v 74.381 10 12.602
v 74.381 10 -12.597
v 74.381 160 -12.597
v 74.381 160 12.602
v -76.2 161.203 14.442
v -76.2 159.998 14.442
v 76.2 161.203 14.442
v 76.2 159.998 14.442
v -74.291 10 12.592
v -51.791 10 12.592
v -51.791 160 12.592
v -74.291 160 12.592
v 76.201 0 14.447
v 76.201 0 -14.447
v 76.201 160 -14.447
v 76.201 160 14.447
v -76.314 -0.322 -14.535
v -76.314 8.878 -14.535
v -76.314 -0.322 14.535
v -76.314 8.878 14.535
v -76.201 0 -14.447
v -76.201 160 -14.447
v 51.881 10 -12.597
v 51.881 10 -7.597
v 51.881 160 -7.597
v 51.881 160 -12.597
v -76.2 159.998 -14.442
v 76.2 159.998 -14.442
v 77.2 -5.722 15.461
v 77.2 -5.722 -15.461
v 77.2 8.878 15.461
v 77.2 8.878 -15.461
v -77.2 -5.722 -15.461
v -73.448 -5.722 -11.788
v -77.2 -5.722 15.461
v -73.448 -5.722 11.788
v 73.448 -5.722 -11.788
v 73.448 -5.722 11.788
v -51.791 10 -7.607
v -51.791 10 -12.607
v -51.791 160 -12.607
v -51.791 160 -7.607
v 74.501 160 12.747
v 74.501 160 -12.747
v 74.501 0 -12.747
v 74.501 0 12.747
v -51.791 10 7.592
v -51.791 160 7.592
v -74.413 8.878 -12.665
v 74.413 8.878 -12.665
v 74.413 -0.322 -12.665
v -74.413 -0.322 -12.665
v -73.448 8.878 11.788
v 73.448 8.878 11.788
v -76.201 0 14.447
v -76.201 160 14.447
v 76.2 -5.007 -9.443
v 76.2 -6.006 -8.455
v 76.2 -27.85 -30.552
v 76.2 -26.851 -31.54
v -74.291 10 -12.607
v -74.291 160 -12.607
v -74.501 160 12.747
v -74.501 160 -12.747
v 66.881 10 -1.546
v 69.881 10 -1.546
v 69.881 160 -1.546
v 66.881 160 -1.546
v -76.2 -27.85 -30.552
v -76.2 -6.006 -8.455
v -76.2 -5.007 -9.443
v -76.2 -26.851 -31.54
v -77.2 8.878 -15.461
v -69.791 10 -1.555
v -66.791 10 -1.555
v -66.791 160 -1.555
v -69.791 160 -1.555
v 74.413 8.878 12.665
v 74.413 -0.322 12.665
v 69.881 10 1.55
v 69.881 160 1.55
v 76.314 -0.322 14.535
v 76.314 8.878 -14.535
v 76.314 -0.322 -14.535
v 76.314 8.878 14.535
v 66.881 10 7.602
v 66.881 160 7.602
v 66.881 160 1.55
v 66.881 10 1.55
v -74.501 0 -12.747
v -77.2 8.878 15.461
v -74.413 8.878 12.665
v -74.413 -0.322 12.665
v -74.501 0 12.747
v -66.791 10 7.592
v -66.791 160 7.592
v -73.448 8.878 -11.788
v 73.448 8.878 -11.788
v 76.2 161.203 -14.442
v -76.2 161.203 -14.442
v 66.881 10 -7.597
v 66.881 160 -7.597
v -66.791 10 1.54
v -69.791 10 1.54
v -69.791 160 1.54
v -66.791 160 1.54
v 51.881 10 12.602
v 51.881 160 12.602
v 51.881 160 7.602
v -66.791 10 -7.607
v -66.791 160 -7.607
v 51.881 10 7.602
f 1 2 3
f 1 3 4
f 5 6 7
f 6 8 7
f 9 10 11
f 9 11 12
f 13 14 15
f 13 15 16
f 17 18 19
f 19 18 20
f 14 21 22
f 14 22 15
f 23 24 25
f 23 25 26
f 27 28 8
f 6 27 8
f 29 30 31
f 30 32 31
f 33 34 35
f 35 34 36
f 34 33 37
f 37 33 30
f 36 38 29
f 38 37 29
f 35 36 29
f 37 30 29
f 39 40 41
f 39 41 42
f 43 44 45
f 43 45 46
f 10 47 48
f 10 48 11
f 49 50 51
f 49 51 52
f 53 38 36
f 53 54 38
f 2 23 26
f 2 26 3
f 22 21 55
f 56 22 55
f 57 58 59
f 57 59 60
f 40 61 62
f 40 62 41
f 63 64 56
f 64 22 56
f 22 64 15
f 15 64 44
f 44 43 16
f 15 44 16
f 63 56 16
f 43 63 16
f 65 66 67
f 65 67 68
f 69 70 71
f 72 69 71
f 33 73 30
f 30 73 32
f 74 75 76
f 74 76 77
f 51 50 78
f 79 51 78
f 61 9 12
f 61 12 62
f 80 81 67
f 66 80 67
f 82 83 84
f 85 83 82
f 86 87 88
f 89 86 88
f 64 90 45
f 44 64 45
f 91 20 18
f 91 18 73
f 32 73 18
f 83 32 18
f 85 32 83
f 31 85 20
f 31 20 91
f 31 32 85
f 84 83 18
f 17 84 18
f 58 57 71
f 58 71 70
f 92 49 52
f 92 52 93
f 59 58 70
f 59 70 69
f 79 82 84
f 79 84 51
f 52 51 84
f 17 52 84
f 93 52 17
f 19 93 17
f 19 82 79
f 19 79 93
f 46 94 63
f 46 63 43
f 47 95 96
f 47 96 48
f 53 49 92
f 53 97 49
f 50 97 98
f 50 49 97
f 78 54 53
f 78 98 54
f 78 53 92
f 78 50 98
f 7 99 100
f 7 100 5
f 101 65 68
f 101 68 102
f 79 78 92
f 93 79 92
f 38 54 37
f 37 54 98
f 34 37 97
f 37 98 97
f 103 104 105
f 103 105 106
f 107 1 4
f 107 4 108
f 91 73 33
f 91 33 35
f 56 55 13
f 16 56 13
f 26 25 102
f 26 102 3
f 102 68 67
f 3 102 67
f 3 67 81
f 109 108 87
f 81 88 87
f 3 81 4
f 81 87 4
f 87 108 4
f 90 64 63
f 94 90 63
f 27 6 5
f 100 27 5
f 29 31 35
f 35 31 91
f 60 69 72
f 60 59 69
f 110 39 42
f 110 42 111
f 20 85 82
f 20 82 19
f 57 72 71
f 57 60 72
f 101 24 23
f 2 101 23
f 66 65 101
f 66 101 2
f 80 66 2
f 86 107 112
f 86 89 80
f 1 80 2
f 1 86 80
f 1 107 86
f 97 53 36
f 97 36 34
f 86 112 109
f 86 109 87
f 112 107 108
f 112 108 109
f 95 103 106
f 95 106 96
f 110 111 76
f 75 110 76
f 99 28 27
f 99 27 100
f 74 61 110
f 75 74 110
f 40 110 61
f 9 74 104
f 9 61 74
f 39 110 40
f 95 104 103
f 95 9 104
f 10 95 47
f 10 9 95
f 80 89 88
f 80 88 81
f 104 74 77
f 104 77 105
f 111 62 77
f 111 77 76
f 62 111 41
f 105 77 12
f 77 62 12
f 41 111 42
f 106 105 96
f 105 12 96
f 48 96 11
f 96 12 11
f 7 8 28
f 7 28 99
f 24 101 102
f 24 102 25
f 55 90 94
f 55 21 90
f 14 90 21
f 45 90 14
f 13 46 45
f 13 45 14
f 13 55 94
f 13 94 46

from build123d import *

# Parameters (mm, degrees)
F0_W      = 152.4018198252
F0_H      = 28.8946051151
F0_W_2    = 149.0018218756
F0_H_2    = 25.4946071655
F1_DEPTH  = 160
F3_START  = -10
F3_DEPTH  = 150
F5_START  = -10
F5_DEPTH  = 150
F6_W      = 1.2055812009
F6_H      = 28.8845263422
F7_DEPTH  = 76.2
F9_DEPTH  = 76.2
F10_W     = 10
F10_H     = 30.9223439544
F11_DEPTH = 77.2
F12_W     = 146.8962877989
F12_H     = 23.5759057105
F13_DEPTH = 112.4
F14_W     = 152.6277539183
F14_H     = 29.0700802796
F14_W_2   = 148.8256156445
F14_H_2   = 25.3299812903
F15_DEPTH = 9.2
F16_DEPTH = 4.6


with BuildPart() as f1:
    # F0 (on Front) → F1 (new body)
    with BuildSketch(Plane.XZ):
        Rectangle(F0_W, F0_H)
        Rectangle(F0_W_2, F0_H_2, mode=Mode.SUBTRACT)
    extrude(amount=-F1_DEPTH)


with BuildPart() as f3:
    # F2 (on Front) → F3 (new body)
    with BuildSketch(Plane.XZ.offset(F3_START)):
        Polygon((-51.7913967393, 12.5920321899), (-74.2913967393, 12.5920321899), (-74.2913967393, -12.6069678101), (-51.7913967393, -12.6069678101), (-51.7913967393, -7.6069678101), (-66.7913967393, -7.6069678101), (-66.7913967393, -1.5549678101), (-69.7913967393, -1.5549678101), (-69.7913967393, 1.5400321899), (-66.7913967393, 1.5400321899), (-66.7913967393, 7.5920321899), (-51.7913967393, 7.5920321899), align=None)
    extrude(amount=-F3_DEPTH)


with BuildPart() as f5:
    # F4 (on Front) → F5 (new body)
    with BuildSketch(Plane.XZ.offset(F5_START)):
        Polygon((74.3810287863, 12.6020161743), (51.8810287863, 12.6020161743), (51.8810287863, 7.6020161743), (66.8810287863, 7.6020161743), (66.8810287863, 1.5500161743), (69.8810287863, 1.5500161743), (69.8810287863, -1.5458079478), (66.8810287863, -1.5458079478), (66.8810287863, -7.5974407703), (51.8810287863, -7.5974407703), (51.8810287863, -12.5974407703), (74.3810287863, -12.5974407703), align=None)
    extrude(amount=-F5_DEPTH)


with BuildPart() as f7:
    # F6 (on Right) → F7 (new body, symmetric)
    with BuildSketch(Plane.YZ):
        with Locations((160.6003283326, 0)):
            Rectangle(F6_W, F6_H)
    extrude(amount=F7_DEPTH, both=True)


with BuildPart() as f9:
    # F8 (on Right) → F9 (new body, symmetric)
    with BuildSketch(Plane.YZ):
        Polygon((-26.8510025357, -31.5395196355), (-5.0067298549, -9.4426561112), (-6.0056681545, -8.4551367475), (-27.8499408353, -30.5520002717), align=None)
    extrude(amount=F9_DEPTH, both=True)


with BuildPart() as f11:
    # F10 (on Right) → F11 (new body, symmetric)
    with BuildSketch(Plane.YZ):
        with Locations((3.8782835472, 0)):
            Rectangle(F10_W, F10_H)
    extrude(amount=F11_DEPTH, both=True)

    # F12 (on face) → F13 (cut, symmetric)
    with BuildSketch(Plane.XZ.offset(1.1217164528)):
        Rectangle(F12_W, F12_H)
    extrude(amount=F13_DEPTH, both=True, mode=Mode.SUBTRACT)

    # F14 (on face) → F15 (cut)
    with BuildSketch(Plane(origin=(0, 8.8782835472, 0), x_dir=(-1, 0, 0), z_dir=(0, 1, 0))):
        Rectangle(F14_W, F14_H)
        Rectangle(F14_W_2, F14_H_2, mode=Mode.SUBTRACT)
    extrude(amount=-F15_DEPTH, mode=Mode.SUBTRACT)

    # F16 (add): a face of the model
    f16_faces = [f11.faces().sort_by_distance(p)[0] for p in [
        (0, -1.1217164528, 13.8865116534),
    ]]
    extrude(f16_faces, amount=F16_DEPTH)


solid = Compound([f1.part, f3.part, f5.part, f7.part, f9.part, f11.part])
